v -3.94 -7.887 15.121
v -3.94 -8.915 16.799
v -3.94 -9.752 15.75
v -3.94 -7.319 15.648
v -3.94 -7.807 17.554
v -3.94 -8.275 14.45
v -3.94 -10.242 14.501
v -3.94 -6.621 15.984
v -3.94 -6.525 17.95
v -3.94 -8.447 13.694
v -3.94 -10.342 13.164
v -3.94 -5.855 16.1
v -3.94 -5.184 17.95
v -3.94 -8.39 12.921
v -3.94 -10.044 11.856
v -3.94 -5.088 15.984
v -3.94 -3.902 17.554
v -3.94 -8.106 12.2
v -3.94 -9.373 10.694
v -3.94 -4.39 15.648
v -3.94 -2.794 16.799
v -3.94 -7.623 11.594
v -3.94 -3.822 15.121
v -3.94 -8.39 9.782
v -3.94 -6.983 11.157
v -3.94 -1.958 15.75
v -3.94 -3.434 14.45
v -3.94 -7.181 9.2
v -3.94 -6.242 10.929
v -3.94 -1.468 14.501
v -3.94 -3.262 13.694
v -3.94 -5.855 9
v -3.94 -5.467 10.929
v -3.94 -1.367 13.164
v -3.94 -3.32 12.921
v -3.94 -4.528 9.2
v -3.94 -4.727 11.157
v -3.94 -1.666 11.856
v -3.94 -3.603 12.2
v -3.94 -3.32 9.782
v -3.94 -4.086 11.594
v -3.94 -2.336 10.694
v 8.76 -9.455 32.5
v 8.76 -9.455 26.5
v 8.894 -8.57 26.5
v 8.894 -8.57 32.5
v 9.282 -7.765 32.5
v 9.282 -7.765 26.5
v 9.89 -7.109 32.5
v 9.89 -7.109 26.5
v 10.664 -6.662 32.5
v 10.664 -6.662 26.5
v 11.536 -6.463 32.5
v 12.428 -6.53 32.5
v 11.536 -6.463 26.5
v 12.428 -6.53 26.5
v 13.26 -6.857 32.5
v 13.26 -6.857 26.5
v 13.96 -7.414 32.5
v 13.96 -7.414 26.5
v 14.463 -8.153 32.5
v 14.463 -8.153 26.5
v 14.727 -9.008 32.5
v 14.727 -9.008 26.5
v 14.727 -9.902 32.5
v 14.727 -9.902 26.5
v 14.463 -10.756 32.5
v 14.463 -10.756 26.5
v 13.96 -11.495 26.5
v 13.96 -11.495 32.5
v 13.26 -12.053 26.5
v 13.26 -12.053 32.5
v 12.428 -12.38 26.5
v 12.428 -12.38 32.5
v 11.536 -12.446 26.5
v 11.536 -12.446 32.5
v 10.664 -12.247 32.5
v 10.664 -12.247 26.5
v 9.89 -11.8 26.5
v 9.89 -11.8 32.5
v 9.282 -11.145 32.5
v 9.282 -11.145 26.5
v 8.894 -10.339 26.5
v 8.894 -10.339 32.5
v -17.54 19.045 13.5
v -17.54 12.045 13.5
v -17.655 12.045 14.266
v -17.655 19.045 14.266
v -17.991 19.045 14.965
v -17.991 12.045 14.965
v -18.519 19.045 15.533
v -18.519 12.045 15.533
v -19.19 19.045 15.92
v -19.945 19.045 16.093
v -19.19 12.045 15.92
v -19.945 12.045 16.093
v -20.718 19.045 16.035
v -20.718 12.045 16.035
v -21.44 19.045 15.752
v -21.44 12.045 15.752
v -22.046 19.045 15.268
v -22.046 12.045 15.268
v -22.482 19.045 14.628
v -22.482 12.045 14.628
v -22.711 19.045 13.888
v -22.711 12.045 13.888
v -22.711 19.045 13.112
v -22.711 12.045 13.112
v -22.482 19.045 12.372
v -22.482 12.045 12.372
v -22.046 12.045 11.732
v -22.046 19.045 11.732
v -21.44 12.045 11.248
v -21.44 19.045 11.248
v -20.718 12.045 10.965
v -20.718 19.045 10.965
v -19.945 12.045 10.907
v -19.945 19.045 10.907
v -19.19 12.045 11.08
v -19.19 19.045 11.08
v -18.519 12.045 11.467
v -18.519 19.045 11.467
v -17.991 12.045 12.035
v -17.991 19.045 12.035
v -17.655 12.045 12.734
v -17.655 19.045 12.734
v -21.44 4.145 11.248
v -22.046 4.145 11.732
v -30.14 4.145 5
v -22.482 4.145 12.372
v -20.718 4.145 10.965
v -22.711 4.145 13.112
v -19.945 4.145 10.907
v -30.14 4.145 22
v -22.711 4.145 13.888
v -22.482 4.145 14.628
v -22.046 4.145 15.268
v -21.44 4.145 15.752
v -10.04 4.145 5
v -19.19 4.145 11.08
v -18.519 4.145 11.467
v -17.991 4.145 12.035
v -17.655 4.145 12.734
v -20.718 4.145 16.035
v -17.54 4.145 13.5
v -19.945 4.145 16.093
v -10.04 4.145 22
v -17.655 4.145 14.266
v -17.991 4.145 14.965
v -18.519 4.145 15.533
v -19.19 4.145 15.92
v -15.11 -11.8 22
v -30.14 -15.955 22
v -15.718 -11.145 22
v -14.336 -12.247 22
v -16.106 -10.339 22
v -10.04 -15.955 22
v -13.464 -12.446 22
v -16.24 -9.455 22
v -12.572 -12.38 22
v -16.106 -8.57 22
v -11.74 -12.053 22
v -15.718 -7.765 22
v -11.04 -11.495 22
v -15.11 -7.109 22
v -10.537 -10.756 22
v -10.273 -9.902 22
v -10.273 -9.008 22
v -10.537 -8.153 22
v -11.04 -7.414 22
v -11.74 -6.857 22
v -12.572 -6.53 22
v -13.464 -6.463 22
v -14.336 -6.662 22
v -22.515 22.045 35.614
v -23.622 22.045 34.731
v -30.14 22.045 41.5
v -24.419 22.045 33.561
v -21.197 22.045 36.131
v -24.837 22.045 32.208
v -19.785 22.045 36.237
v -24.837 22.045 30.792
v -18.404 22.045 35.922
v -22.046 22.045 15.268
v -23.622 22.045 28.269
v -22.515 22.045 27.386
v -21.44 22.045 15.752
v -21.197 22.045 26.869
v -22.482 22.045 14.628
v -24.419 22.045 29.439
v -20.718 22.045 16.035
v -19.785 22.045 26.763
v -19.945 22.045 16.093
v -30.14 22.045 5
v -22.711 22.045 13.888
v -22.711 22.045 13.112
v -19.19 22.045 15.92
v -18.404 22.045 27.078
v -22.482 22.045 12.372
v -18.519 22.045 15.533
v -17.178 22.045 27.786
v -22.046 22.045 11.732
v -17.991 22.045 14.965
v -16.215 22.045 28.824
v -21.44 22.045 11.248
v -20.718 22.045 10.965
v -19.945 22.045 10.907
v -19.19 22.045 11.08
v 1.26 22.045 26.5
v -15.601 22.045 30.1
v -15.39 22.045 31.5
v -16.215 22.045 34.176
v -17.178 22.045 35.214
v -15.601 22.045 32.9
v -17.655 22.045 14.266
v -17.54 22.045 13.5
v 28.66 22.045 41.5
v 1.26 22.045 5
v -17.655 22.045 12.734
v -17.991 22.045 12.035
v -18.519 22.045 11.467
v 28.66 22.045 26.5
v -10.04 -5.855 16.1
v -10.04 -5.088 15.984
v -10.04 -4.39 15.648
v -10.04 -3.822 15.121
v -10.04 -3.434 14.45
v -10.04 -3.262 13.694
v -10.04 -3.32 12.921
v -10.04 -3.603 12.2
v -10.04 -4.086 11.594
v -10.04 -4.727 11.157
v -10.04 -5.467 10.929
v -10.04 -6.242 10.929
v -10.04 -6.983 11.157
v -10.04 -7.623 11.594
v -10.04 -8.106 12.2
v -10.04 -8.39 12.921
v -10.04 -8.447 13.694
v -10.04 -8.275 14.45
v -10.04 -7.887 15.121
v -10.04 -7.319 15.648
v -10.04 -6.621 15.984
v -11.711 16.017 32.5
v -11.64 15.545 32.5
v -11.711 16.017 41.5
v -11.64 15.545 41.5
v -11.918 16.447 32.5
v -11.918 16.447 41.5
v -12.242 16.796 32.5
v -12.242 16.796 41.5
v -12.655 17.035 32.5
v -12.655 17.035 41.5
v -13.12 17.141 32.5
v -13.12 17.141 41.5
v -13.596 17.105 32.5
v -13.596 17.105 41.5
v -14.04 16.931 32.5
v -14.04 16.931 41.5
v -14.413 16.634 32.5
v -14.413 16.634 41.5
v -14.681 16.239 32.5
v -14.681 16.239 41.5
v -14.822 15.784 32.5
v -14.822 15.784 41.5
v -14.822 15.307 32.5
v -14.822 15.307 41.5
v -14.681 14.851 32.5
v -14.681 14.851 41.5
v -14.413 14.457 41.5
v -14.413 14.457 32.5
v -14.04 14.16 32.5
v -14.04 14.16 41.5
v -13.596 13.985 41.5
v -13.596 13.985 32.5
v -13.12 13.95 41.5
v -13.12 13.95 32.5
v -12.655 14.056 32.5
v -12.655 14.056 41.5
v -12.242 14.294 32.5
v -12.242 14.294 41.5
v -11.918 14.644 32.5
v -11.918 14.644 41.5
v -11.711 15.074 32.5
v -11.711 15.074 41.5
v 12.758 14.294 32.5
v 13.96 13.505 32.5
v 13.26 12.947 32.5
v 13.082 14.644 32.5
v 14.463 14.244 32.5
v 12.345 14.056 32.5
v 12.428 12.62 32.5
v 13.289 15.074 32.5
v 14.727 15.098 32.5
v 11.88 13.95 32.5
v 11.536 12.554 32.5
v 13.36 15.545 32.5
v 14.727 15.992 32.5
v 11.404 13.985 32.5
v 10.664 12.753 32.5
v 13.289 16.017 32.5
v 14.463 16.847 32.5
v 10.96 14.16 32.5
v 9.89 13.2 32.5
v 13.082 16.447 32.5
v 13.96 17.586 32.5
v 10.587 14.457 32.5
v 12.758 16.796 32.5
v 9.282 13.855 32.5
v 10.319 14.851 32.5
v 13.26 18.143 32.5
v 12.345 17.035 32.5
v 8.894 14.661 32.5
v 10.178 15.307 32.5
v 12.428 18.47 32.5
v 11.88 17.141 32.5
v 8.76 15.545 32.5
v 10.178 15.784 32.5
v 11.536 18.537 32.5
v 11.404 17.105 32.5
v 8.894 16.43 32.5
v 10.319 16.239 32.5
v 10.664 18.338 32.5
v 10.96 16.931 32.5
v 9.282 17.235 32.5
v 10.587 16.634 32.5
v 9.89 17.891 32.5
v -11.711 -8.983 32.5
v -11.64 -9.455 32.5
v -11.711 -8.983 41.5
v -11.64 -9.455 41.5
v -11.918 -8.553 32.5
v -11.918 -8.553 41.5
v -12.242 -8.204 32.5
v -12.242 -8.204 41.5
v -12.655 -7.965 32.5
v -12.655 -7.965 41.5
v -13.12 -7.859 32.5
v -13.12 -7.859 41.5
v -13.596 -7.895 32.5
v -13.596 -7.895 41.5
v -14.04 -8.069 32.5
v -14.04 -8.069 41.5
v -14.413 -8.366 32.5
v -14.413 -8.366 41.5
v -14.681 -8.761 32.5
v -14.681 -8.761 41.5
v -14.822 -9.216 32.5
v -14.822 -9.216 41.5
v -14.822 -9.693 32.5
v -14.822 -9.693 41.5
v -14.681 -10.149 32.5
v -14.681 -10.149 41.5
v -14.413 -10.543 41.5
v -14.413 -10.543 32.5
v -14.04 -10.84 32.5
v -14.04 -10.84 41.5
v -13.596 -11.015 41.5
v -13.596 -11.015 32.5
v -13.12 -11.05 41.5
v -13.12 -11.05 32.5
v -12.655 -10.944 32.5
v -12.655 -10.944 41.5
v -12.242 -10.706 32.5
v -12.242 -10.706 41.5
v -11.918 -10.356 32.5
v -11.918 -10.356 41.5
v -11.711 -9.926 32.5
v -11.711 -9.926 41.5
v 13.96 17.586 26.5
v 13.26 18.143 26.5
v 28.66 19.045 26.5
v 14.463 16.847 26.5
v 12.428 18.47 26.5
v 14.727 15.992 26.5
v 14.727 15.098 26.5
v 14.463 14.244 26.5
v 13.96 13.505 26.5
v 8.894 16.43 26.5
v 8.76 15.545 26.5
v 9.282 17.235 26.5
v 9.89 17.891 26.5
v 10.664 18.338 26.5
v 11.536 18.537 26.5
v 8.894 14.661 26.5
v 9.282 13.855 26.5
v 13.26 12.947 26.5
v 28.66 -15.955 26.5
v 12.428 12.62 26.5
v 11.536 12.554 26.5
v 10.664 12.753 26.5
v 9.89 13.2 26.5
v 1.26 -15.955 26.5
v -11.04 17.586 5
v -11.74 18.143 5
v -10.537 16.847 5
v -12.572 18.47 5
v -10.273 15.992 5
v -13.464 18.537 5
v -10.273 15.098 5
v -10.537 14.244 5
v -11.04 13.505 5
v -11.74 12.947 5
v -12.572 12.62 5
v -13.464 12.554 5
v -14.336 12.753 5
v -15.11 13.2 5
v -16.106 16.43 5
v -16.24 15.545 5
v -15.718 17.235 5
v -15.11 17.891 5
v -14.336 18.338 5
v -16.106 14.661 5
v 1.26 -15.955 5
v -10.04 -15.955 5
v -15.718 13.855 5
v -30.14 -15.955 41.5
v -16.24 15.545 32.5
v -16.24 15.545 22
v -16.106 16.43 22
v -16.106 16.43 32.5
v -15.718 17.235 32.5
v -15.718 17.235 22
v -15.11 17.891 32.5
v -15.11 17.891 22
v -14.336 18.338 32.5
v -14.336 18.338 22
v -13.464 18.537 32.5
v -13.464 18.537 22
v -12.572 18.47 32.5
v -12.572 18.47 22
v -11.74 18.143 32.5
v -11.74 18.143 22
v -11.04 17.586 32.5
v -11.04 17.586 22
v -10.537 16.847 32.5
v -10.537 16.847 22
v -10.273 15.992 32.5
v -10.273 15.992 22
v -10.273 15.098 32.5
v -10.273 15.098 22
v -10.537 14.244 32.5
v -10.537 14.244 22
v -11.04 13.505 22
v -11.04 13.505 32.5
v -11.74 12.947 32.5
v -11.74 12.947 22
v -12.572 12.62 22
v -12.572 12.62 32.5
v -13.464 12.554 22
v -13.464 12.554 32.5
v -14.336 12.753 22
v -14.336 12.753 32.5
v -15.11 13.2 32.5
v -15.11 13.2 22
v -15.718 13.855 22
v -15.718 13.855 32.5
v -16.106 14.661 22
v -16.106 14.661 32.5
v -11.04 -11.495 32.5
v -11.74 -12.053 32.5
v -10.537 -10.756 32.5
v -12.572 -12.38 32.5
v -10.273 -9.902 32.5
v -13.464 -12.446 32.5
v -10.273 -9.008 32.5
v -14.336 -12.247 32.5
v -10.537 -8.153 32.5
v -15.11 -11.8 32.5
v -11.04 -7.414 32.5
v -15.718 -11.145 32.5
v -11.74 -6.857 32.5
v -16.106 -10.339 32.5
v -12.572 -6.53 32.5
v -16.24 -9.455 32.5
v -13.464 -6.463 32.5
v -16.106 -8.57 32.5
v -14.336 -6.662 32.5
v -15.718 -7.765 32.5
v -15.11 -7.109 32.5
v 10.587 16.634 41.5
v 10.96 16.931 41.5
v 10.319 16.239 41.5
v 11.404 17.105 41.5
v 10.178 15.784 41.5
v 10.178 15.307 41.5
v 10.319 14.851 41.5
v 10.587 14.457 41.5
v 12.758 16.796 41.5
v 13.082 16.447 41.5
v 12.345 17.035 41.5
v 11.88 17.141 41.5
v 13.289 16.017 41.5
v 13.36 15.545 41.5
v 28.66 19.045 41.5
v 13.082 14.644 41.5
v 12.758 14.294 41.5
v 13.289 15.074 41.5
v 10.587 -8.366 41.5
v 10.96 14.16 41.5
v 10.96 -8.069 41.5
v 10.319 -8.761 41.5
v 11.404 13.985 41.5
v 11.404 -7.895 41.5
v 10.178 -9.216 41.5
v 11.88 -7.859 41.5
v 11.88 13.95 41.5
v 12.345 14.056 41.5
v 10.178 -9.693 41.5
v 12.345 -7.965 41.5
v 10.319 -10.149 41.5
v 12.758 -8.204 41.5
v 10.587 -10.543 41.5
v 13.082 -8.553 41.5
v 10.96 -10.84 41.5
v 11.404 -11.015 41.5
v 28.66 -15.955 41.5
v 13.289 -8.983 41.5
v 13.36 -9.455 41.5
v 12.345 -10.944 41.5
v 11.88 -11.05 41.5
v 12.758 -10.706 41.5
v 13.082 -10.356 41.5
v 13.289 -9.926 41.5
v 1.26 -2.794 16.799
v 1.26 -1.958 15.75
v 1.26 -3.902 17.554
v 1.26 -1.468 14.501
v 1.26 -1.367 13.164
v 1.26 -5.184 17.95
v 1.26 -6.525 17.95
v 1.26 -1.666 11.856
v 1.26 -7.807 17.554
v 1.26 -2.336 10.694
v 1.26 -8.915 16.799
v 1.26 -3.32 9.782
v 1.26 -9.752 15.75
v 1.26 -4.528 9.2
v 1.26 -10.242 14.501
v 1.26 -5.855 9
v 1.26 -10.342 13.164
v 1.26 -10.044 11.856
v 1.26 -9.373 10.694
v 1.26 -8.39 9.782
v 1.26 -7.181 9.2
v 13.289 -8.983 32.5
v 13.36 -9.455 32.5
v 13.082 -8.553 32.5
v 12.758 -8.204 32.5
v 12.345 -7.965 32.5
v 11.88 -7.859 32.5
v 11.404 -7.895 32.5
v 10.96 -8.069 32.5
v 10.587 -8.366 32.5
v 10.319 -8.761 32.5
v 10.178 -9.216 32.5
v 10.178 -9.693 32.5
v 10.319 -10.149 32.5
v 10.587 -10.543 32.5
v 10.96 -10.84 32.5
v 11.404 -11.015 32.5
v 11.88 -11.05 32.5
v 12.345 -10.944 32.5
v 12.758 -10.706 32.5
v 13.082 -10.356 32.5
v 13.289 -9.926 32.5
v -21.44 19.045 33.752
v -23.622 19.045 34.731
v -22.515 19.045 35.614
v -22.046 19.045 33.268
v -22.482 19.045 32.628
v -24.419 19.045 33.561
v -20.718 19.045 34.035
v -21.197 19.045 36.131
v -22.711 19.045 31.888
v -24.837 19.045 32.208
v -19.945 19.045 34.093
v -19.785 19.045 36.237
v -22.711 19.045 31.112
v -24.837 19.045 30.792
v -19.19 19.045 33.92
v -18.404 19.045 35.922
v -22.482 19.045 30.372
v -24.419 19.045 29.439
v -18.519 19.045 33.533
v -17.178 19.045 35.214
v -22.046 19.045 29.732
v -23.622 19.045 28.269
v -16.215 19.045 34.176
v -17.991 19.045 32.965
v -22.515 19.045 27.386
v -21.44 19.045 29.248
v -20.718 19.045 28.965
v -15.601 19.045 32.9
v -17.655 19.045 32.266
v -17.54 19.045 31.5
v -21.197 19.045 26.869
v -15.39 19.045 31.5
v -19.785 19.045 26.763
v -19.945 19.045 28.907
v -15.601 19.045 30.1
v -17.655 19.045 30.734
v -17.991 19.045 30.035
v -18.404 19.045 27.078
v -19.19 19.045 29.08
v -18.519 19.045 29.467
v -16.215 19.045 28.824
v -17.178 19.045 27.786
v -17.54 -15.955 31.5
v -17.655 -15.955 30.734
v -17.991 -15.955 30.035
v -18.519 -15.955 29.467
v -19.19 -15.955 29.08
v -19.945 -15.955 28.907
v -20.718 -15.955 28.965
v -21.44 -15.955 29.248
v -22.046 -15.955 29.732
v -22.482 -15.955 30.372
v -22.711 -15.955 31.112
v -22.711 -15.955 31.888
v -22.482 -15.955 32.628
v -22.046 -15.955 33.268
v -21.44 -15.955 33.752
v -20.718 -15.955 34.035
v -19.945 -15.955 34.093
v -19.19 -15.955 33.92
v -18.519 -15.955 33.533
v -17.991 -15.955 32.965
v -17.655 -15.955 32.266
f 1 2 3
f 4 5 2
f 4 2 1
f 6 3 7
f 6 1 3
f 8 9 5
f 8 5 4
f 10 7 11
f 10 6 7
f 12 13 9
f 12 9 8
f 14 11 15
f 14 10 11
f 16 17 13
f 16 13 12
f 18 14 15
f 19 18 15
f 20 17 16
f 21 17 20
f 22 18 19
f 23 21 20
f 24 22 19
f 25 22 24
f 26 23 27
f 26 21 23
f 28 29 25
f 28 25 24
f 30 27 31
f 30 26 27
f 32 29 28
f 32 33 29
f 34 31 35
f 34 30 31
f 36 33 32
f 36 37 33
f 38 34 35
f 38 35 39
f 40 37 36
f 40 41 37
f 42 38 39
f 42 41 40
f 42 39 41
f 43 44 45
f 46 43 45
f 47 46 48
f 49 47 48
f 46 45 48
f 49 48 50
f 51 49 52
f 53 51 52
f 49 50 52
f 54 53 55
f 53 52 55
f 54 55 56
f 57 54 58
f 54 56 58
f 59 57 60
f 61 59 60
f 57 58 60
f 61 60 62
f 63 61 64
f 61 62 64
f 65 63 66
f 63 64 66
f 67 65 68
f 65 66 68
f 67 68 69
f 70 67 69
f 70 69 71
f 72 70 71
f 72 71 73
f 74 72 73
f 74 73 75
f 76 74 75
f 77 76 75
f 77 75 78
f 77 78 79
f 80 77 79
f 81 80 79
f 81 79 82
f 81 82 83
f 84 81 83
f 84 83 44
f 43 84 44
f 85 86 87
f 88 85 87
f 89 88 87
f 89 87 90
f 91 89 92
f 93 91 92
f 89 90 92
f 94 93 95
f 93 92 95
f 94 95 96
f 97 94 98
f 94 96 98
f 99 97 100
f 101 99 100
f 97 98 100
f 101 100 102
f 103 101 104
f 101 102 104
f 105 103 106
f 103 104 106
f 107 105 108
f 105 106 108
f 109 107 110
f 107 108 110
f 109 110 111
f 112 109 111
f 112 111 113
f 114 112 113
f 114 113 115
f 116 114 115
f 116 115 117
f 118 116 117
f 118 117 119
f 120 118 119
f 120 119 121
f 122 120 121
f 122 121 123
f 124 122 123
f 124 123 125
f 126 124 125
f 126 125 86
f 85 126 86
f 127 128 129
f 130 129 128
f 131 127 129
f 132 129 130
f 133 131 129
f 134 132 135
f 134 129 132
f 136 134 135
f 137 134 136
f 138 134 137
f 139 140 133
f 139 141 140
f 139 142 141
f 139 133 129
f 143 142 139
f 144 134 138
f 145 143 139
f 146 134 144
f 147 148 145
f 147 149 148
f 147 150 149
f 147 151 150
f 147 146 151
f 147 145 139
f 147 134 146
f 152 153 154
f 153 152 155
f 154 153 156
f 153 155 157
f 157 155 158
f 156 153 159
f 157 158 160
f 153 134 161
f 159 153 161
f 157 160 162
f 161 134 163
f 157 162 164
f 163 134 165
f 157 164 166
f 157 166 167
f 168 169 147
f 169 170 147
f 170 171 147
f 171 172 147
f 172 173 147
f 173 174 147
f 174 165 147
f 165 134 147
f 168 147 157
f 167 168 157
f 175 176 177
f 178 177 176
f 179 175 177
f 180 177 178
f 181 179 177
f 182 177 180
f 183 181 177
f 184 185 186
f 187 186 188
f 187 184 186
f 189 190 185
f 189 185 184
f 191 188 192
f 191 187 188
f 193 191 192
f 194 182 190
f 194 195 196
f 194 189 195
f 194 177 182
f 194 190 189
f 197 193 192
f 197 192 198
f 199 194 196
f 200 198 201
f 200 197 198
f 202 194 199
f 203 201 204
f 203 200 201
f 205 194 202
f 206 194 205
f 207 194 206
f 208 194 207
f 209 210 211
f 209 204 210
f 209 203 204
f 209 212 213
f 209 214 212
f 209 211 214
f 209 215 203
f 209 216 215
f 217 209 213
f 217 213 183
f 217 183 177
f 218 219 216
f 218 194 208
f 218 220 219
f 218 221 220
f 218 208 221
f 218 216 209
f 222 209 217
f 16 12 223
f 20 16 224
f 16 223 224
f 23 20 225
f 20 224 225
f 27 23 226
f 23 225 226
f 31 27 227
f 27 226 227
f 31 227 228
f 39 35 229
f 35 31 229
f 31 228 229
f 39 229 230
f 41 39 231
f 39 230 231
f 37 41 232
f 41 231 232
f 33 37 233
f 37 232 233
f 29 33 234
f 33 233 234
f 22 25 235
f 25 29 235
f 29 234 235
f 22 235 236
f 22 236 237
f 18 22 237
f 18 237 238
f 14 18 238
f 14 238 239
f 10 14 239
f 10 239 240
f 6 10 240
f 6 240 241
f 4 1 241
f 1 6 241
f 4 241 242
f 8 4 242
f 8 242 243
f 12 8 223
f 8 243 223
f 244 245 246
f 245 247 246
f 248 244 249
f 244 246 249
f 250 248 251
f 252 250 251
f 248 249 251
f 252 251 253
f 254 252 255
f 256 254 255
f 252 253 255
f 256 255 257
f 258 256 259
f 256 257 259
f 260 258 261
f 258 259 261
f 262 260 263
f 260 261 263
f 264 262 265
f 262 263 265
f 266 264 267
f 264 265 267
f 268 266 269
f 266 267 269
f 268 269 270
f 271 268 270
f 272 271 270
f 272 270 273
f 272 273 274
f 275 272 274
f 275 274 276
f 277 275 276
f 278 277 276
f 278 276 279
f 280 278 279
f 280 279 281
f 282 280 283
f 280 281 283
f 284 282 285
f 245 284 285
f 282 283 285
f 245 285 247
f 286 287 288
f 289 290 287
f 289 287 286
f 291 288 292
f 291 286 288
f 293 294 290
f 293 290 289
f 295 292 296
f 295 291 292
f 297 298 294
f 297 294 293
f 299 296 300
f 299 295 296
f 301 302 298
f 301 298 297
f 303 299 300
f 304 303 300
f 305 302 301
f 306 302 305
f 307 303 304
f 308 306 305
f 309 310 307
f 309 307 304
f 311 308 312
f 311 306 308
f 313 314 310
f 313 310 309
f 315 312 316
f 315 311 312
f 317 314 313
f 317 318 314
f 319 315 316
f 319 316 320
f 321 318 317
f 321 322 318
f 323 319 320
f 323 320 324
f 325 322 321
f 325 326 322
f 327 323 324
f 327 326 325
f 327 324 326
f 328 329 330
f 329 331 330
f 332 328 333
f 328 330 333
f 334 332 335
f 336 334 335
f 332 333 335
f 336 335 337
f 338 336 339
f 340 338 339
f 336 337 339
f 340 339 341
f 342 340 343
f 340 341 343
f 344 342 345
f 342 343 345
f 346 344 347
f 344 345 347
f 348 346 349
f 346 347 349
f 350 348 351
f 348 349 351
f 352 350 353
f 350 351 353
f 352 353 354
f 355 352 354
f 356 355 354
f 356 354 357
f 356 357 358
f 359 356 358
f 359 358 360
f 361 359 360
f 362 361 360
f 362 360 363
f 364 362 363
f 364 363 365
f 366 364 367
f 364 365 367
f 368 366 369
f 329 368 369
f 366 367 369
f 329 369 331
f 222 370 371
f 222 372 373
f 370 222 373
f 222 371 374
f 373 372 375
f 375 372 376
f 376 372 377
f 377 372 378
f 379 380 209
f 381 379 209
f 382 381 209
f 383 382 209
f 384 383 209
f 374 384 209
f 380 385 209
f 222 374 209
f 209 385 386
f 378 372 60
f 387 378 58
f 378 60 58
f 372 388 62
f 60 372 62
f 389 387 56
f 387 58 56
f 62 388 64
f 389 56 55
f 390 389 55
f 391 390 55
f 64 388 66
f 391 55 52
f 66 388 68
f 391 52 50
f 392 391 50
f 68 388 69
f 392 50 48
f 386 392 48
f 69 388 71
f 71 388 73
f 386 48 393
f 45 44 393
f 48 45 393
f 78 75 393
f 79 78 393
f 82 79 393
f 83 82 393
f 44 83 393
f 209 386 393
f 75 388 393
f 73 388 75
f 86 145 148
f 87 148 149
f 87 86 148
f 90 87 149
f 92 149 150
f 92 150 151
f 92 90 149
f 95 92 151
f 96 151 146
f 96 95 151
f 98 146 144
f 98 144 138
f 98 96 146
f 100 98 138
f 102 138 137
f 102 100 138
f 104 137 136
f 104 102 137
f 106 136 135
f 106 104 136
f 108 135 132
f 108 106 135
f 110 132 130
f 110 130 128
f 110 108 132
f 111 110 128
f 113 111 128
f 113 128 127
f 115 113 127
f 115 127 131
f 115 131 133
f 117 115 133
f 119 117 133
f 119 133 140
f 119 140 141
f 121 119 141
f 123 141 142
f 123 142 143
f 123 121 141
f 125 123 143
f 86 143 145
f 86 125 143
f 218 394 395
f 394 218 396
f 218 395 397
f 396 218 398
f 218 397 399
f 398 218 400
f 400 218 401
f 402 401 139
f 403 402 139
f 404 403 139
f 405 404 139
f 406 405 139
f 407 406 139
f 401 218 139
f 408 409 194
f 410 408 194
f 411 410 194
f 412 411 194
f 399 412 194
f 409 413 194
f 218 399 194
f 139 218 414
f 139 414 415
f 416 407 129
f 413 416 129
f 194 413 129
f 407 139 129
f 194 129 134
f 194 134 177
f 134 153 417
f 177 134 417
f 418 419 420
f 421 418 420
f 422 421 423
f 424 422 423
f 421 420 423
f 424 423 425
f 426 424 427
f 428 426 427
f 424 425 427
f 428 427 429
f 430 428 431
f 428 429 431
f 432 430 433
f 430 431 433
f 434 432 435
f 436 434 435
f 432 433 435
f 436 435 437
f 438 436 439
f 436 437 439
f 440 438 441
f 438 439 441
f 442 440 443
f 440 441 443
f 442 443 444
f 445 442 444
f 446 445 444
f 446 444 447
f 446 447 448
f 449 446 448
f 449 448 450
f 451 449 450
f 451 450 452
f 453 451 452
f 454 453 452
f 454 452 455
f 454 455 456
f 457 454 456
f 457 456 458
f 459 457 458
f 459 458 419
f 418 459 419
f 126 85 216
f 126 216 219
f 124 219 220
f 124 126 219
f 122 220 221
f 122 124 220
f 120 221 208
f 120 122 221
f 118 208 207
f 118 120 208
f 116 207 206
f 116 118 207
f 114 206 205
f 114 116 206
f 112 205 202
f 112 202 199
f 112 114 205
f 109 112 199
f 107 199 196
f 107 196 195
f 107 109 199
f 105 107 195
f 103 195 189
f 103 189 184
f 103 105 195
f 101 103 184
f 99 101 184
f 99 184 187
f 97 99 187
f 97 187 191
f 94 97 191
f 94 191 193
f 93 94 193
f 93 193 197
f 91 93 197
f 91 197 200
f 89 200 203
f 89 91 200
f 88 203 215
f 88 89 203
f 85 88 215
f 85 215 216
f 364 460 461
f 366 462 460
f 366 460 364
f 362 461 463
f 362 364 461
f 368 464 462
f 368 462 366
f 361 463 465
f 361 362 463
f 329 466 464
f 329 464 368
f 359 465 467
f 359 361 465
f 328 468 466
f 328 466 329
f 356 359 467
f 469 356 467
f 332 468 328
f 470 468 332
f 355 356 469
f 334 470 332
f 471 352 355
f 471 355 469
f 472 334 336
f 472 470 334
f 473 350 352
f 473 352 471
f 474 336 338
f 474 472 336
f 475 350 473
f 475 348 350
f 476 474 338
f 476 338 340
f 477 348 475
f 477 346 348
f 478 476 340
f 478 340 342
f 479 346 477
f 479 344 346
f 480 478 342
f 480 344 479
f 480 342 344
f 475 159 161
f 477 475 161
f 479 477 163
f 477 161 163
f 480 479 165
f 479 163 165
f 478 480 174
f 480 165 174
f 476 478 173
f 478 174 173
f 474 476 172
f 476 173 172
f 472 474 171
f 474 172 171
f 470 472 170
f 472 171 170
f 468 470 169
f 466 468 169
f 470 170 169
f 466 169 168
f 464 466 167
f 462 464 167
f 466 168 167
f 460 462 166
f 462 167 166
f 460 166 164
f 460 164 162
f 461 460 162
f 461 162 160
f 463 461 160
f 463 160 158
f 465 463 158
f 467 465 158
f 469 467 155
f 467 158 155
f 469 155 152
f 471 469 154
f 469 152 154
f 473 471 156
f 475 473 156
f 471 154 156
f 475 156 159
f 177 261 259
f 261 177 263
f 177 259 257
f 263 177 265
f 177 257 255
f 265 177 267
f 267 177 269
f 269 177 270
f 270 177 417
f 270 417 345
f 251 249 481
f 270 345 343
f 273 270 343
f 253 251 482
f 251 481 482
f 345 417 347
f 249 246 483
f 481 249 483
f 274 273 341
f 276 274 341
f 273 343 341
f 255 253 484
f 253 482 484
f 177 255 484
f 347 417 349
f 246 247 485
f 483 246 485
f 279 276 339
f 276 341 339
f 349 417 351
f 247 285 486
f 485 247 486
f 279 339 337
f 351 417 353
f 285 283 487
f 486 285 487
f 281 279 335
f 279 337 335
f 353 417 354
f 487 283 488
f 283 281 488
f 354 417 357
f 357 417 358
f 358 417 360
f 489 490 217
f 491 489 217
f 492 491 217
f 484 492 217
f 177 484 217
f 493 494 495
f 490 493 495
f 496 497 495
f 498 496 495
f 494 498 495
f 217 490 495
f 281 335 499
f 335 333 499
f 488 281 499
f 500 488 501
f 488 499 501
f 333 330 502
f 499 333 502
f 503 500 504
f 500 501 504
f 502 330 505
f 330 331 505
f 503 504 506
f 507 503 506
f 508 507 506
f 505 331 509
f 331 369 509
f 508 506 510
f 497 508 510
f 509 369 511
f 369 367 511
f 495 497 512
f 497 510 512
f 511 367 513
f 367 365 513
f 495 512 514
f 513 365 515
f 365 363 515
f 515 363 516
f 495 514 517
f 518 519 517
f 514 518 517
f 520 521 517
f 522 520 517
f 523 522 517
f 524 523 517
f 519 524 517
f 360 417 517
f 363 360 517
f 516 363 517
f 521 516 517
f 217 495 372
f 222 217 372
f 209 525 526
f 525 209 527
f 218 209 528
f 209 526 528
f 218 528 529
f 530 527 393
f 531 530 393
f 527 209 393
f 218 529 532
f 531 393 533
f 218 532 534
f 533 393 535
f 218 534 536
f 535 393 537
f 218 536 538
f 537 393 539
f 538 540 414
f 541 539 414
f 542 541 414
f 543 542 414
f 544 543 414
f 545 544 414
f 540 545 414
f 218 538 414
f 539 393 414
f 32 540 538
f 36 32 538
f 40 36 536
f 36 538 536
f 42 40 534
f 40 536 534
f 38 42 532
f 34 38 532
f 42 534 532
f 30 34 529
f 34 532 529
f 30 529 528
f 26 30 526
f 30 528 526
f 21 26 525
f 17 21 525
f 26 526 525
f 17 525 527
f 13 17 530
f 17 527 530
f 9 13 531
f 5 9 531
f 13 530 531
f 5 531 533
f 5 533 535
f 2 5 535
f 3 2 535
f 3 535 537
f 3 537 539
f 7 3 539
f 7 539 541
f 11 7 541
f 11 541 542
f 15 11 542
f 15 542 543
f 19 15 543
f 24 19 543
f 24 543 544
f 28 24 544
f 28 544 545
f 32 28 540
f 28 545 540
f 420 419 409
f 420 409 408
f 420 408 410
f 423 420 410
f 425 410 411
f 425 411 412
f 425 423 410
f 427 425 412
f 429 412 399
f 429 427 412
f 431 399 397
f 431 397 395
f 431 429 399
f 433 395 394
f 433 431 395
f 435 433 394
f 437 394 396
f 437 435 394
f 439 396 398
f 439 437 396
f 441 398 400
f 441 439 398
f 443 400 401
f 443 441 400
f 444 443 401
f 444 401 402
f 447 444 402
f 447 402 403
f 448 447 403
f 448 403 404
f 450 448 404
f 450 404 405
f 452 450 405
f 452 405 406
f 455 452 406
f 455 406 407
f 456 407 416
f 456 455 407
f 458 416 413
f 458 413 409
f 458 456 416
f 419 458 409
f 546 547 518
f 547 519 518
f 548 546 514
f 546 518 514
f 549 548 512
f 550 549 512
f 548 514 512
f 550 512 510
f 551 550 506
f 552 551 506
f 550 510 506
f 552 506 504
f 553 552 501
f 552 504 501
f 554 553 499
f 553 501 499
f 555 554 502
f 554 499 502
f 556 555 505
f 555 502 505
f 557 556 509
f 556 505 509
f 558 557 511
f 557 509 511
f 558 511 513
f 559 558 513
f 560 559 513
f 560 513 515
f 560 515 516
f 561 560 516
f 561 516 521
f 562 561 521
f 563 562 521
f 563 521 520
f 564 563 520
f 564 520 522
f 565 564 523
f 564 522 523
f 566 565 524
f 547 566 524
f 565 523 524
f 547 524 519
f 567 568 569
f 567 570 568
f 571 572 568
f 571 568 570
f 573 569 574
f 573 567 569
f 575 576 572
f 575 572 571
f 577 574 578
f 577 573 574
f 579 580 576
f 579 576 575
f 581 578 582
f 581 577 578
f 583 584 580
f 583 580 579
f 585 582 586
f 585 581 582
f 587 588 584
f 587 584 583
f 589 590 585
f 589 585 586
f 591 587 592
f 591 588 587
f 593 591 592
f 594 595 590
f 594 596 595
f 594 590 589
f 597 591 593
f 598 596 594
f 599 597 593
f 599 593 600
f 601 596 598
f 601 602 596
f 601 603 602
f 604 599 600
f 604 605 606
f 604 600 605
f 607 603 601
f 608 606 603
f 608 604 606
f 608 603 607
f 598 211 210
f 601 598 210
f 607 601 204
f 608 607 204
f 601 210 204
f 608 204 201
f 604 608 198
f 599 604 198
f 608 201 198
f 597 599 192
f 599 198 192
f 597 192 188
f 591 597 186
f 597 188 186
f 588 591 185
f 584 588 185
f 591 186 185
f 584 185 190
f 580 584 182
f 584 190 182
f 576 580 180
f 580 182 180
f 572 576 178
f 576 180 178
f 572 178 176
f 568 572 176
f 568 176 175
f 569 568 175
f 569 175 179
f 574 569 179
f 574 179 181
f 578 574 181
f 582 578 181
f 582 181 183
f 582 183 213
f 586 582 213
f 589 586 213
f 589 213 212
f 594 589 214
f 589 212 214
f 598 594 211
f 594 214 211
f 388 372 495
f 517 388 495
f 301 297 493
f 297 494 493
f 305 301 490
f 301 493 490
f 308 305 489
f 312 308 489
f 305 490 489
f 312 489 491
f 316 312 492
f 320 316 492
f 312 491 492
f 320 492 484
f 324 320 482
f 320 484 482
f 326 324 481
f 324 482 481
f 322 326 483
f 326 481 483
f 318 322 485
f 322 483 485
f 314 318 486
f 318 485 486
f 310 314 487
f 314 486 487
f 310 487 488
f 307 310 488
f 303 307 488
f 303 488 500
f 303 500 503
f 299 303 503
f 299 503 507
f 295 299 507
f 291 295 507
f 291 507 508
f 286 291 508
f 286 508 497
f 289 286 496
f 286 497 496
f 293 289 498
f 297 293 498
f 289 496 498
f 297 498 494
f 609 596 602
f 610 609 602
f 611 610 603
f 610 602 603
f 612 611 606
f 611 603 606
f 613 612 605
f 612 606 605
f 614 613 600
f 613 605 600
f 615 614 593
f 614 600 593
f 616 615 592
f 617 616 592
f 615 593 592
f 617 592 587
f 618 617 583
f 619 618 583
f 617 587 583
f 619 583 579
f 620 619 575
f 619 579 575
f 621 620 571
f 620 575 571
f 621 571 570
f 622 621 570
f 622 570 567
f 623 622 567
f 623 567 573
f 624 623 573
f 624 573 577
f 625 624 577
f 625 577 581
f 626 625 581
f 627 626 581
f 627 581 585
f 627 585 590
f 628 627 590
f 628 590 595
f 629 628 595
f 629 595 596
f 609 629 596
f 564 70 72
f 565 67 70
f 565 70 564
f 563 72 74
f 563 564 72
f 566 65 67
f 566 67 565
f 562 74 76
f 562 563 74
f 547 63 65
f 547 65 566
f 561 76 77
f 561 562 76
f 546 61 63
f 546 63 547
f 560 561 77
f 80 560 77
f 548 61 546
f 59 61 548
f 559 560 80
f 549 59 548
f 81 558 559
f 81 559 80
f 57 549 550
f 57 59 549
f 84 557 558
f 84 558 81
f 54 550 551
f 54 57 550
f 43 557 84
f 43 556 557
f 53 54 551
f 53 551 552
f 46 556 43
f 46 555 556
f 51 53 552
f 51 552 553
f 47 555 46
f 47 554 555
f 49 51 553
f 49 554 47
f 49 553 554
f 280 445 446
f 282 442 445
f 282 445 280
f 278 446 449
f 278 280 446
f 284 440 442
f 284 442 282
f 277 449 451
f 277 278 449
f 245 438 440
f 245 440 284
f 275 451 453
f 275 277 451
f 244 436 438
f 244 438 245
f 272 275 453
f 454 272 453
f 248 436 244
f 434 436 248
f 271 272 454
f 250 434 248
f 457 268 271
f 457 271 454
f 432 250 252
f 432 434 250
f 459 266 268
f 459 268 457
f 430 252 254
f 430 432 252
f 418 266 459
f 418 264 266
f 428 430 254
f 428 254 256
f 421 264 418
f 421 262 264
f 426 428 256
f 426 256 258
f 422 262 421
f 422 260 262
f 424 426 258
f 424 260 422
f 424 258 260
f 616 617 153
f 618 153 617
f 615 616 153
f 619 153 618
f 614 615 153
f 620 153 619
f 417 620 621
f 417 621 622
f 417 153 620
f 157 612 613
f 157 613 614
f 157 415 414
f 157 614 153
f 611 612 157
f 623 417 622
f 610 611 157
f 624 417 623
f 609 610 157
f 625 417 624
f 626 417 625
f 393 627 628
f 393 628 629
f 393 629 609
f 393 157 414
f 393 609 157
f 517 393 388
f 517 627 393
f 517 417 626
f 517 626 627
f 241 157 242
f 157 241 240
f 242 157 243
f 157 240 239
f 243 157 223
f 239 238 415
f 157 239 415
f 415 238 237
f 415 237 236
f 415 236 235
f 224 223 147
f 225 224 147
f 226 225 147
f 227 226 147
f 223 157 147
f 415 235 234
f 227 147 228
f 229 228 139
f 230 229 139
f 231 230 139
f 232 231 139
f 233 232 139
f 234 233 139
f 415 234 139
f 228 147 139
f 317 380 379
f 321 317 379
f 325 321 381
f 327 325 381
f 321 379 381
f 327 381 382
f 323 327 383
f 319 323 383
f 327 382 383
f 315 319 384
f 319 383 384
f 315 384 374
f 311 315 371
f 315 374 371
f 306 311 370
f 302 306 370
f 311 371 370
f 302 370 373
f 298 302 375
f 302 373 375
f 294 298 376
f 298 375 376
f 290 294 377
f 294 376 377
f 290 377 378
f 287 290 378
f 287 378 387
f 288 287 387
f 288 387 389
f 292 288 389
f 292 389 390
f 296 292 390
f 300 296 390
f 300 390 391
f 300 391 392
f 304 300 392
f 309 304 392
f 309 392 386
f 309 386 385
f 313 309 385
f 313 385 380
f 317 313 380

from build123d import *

# Parameters (mm, degrees)
SKETCH_1_W                = 58.8
SKETCH_1_H                = 32
EXTRUDE_1_DEPTH           = 41.5
HOLE_WIZARD_1_D           = 3.2
HOLE_WIZARD_1_CBORE_D     = 6
HOLE_WIZARD_1_CBORE_DEPTH = 32.5
SKETCH_8_R                = 2.6
CUT_EXTRUDE_6_DEPTH       = 33.5
SKETCH_10_W               = 58.8
SKETCH_10_H               = 41.5
EXTRUDE_2_DEPTH           = 3
SKETCH_18_R               = 2.6
CUT_EXTRUDE_14_DEPTH      = 4
SKETCH_19_W               = 20
SKETCH_19_H               = 20
SKETCH_19_R               = 3
CUT_EXTRUDE_15_DEPTH      = 22
SKETCH_20_R               = 3
CUT_EXTRUDE_16_DEPTH      = 5
CUT_EXTRUDE_17_DEPTH      = 6
SKETCH_22_W               = 27.4
SKETCH_22_H               = 21.5
CUT_EXTRUDE_18_DEPTH      = 36
SKETCH_23_R               = 2.6
CUT_EXTRUDE_19_DEPTH      = 16
CUT_EXTRUDE_20_DEPTH      = 6
SKETCH_25_W               = 20
SKETCH_25_H               = 17
SKETCH_25_R               = 2.6
CUT_EXTRUDE_21_DEPTH      = 0.1
SKETCH_27_W               = 17
SKETCH_27_H               = 20.1
CUT_EXTRUDE_22_DEPTH      = 0.1
SKETCH_28_R               = 2.6
CUT_EXTRUDE_23_DEPTH      = 39.7
SKETCH_29_R               = 4.5
SKETCH_29_R_2             = 2.6
CUT_EXTRUDE_24_DEPTH      = 5
SKETCH_30_R               = 2.6
CUT_EXTRUDE_25_DEPTH      = 36.0000001
SKETCH_31_R               = 2.6
EXTRUDE_3_DEPTH           = 35
SKETCH_32_W               = 20.1
SKETCH_32_H               = 17
SKETCH_32_R               = 2.6
CUT_EXTRUDE_26_DEPTH      = 7
SKETCH_33_W               = 20.1
SKETCH_33_H               = 7
SKETCH_33_R               = 3
EXTRUDE_4_DEPTH           = 17
SKETCH_34_R               = 4.5
EXTRUDE_5_DEPTH           = 5
SKETCH_35_R               = 2.6
EXTRUDE_6_DEPTH           = 6.3
SKETCH_39_R               = 2.6
CUT_EXTRUDE_29_DEPTH      = 8
SKETCH_40_W               = 20.1
SKETCH_40_H               = 17
SKETCH_40_R               = 2.6
EXTRUDE_7_DEPTH           = 7.9
SKETCH_41_W               = 20.1
SKETCH_41_H               = 17
CUT_EXTRUDE_30_DEPTH      = 7.9
SKETCH_42_R               = 2.6
CUT_EXTRUDE_31_DEPTH      = 39.7
SKETCH_43_R               = 4.5
SKETCH_43_R_2             = 2.6
CUT_EXTRUDE_32_DEPTH      = 5.2
SKETCH_44_R               = 2.6
EXTRUDE_8_DEPTH           = 3
SKETCH_46_R               = 4.75
SKETCH_46_R_2             = 2.6
CUT_EXTRUDE_33_DEPTH      = 3


with BuildPart() as part:
    # 草图1 → 凸台-拉伸1 (new body)
    with BuildSketch(Plane.XY):
        with Locations((-0.739622642, 3.045283019)):
            Rectangle(SKETCH_1_W, SKETCH_1_H)
    extrude(amount=EXTRUDE_1_DEPTH)

    # 孔1 (through all)
    with Locations(Plane(origin=(11.760377358, 15.545283019, 0), x_dir=(-1, 0, 0), z_dir=(0, 0, -1))):
        with Locations((0, 0), (25, 0), (25, -25), (0, -25)):
            CounterBoreHole(HOLE_WIZARD_1_D / 2, HOLE_WIZARD_1_CBORE_D / 2, HOLE_WIZARD_1_CBORE_DEPTH)

    # 草图8 → 切除-拉伸6 (cut)
    with BuildSketch(Plane(origin=(0, 19.045283019, 0), x_dir=(1, 0, 0), z_dir=(0, 1, 0))):
        with Locations((-0.739622642, -31.5)):
            Circle(SKETCH_8_R)
    extrude(amount=-CUT_EXTRUDE_6_DEPTH, mode=Mode.SUBTRACT)

    # 草图10 → 凸台-拉伸2 (add)
    with BuildSketch(Plane.XZ.offset(12.954716981)):
        with Locations((-0.739622642, 20.75)):
            Rectangle(SKETCH_10_W, SKETCH_10_H)
    extrude(amount=EXTRUDE_2_DEPTH)

    # 草图18 → 切除-拉伸14 (cut, through all)
    with BuildSketch(Plane(origin=(0, -12.954716981, 0), x_dir=(1, 0, 0), z_dir=(0, 1, 0))):
        with Locations((-0.739622642, -31.5)):
            Circle(SKETCH_18_R)
    extrude(amount=-CUT_EXTRUDE_14_DEPTH, mode=Mode.SUBTRACT)

    # 草图19 → 切除-拉伸15 (cut)
    with BuildSketch(Plane(origin=(0, 0, 0), x_dir=(-1, 0, 0), z_dir=(0, 0, -1))):
        with Locations((20.139622642, 9.045283019)):
            Rectangle(SKETCH_19_W, SKETCH_19_H)
        with Locations((13.239622642, 15.545283019)):
            Circle(SKETCH_19_R, mode=Mode.SUBTRACT)
    extrude(amount=-CUT_EXTRUDE_15_DEPTH, mode=Mode.SUBTRACT)

    # 草图20 → 切除-拉伸16 (cut)
    with BuildSketch(Plane(origin=(0, 0, 0), x_dir=(-1, 0, 0), z_dir=(0, 0, -1))):
        Polygon((30.139622642, -15.954716981), (30.139622642, -0.954716981), (10.139622642, -0.954716981), (10.139622642, 19.045283019), (-28.660377358, 19.045283019), (-28.660377358, -15.954716981), align=None)
        with Locations((13.239622642, -9.454716981)):
            Circle(SKETCH_20_R, mode=Mode.SUBTRACT)
        with Locations((-11.760377358, -9.454716981)):
            Circle(SKETCH_20_R, mode=Mode.SUBTRACT)
        with Locations((-11.760377358, 15.545283019)):
            Circle(SKETCH_20_R, mode=Mode.SUBTRACT)
    extrude(amount=-CUT_EXTRUDE_16_DEPTH, mode=Mode.SUBTRACT)

    # 草图21 → 切除-拉伸17 (cut)
    with BuildSketch(Plane.XZ.offset(15.954716981)):
        Polygon((-30.139622642, 19.214629022), (-17.064744213, 5), (-30.139622642, 5), align=None)
    extrude(amount=-CUT_EXTRUDE_17_DEPTH, mode=Mode.SUBTRACT)

    # 草图22 → 切除-拉伸18 (cut, through all)
    with BuildSketch(Plane(origin=(0, 19.045283019, 0), x_dir=(1, 0, 0), z_dir=(0, 1, 0))):
        with Locations((14.960377358, -15.75)):
            Rectangle(SKETCH_22_W, SKETCH_22_H)
    extrude(amount=-CUT_EXTRUDE_18_DEPTH, mode=Mode.SUBTRACT)

    # 草图23 → 切除-拉伸19 (cut, through all)
    with BuildSketch(Plane(origin=(0, -0.954716981, 0), x_dir=(1, 0, 0), z_dir=(0, 1, 0))):
        with Locations((-20.139622642, -13.5)):
            Circle(SKETCH_23_R)
    extrude(amount=-CUT_EXTRUDE_19_DEPTH, mode=Mode.SUBTRACT)

    # 草图24 → 切除-拉伸20 (cut)
    with BuildSketch(Plane(origin=(0, -15.954716981, 0), x_dir=(-1, 0, 0), z_dir=(0, -1, 0))):
        with BuildLine():
            ThreePointArc((20.787086214, -9.046822379), (16.827633547, -16.546428767), (24.631280369, -13.22611889))
            Line((24.631280369, -13.22611889), (20.787086214, -9.046822379))
        make_face()
        with BuildLine():
            ThreePointArc((20.139622642, -16.1), (18.30114501, -11.661522369), (22.739622642, -13.5))
            ThreePointArc((22.739622642, -13.5), (21.978100273, -15.338477631), (20.139622642, -16.1))
        make_face(mode=Mode.SUBTRACT)
    extrude(amount=-CUT_EXTRUDE_20_DEPTH, mode=Mode.SUBTRACT)

    # 草图25 → 切除-拉伸21 (cut)
    with BuildSketch(Plane(origin=(0, -0.954716981, 0), x_dir=(1, 0, 0), z_dir=(0, 1, 0))):
        with Locations((-20.139622642, -13.5)):
            Rectangle(SKETCH_25_W, SKETCH_25_H)
        with Locations((-20.139622642, -13.5)):
            Circle(SKETCH_25_R, mode=Mode.SUBTRACT)
    extrude(amount=-CUT_EXTRUDE_21_DEPTH, mode=Mode.SUBTRACT)

    # 草图27 → 切除-拉伸22 (cut)
    with BuildSketch(Plane.ZY.offset(10.139622642)):
        with Locations((13.5, 8.995283019)):
            Rectangle(SKETCH_27_W, SKETCH_27_H)
    extrude(amount=-CUT_EXTRUDE_22_DEPTH, mode=Mode.SUBTRACT)

    # 草图28 → 切除-拉伸23 (cut, through all)
    with BuildSketch(Plane.ZY.offset(10.039622642)):
        with Locations((13.5, 8.995283019)):
            Circle(SKETCH_28_R)
    extrude(amount=-CUT_EXTRUDE_23_DEPTH, mode=Mode.SUBTRACT)

    # 草图29 → 切除-拉伸24 (cut)
    with BuildSketch(Plane(origin=(1.260377358, 0, 0), x_dir=(0, 0, -1), z_dir=(1, 0, 0))):
        with Locations((-13.5, 8.995283019)):
            Circle(SKETCH_29_R)
        with Locations((-13.5, 8.995283019)):
            Circle(SKETCH_29_R_2, mode=Mode.SUBTRACT)
    extrude(amount=-CUT_EXTRUDE_24_DEPTH, mode=Mode.SUBTRACT)

    # 草图30 → 切除-拉伸25 (cut, through all)
    with BuildSketch(Plane(origin=(0, 19.045283019, 0), x_dir=(1, 0, 0), z_dir=(0, 1, 0))):
        with Locations((-20.139622642, -31.5)):
            Circle(SKETCH_30_R)
    extrude(amount=-CUT_EXTRUDE_25_DEPTH, mode=Mode.SUBTRACT)

    # 草图31 → 凸台-拉伸3 (add, through all)
    with BuildSketch(Plane(origin=(0, 19.045283019, 0), x_dir=(1, 0, 0), z_dir=(0, 1, 0))):
        with Locations((-0.739622642, -31.5)):
            Circle(SKETCH_31_R)
    extrude(amount=-EXTRUDE_3_DEPTH)

    # 草图32 → 切除-拉伸26 (cut)
    with BuildSketch(Plane(origin=(0, -1.054716981, 0), x_dir=(1, 0, 0), z_dir=(0, 1, 0))):
        with Locations((-20.089622642, -13.5)):
            Rectangle(SKETCH_32_W, SKETCH_32_H)
        with Locations((-20.139622642, -13.5)):
            Circle(SKETCH_32_R, mode=Mode.SUBTRACT)
    extrude(amount=-CUT_EXTRUDE_26_DEPTH, mode=Mode.SUBTRACT)

    # 草图33 → 凸台-拉伸4 (add)
    with BuildSketch(Plane(origin=(0, 0, 22), x_dir=(-1, 0, 0), z_dir=(0, 0, -1))):
        with Locations((20.089622642, 15.545283019)):
            Rectangle(SKETCH_33_W, SKETCH_33_H)
        with Locations((13.239622642, 15.545283019)):
            Circle(SKETCH_33_R, mode=Mode.SUBTRACT)
    extrude(amount=EXTRUDE_4_DEPTH)

    # 草图34 → 凸台-拉伸5 (add)
    with BuildSketch(Plane(origin=(-3.739622642, 0, 0), x_dir=(0, 0, -1), z_dir=(1, 0, 0))):
        with Locations((-13.5, 8.995283019)):
            Circle(SKETCH_34_R)
    extrude(amount=EXTRUDE_5_DEPTH)

    # 草图35 → 凸台-拉伸6 (add)
    with BuildSketch(Plane.ZY.offset(3.739622642)):
        with Locations((13.5, 8.995283019)):
            Circle(SKETCH_35_R)
    extrude(amount=EXTRUDE_6_DEPTH)

    # 草图39 → 切除-拉伸29 (cut, through all)
    with BuildSketch(Plane.XZ.offset(-12.045283019)):
        with Locations((-20.139622642, 13.5)):
            Circle(SKETCH_39_R)
    extrude(amount=-CUT_EXTRUDE_29_DEPTH, mode=Mode.SUBTRACT)

    # 草图40 → 凸台-拉伸7 (add)
    with BuildSketch(Plane.XZ.offset(-12.045283019)):
        with Locations((-20.089622642, 13.5)):
            Rectangle(SKETCH_40_W, SKETCH_40_H)
        with Locations((-20.139622642, 13.5)):
            Circle(SKETCH_40_R, mode=Mode.SUBTRACT)
    extrude(amount=EXTRUDE_7_DEPTH)

    # 草图41 → 切除-拉伸30 (cut)
    with BuildSketch(Plane(origin=(0, -8.054716981, 0), x_dir=(1, 0, 0), z_dir=(0, 1, 0))):
        with Locations((-20.089622642, -13.5)):
            Rectangle(SKETCH_41_W, SKETCH_41_H)
    extrude(amount=-CUT_EXTRUDE_30_DEPTH, mode=Mode.SUBTRACT)

    # 草图42 → 切除-拉伸31 (cut, through all)
    with BuildSketch(Plane.ZY.offset(10.039622642)):
        with Locations((13.5, -5.854716981)):
            Circle(SKETCH_42_R)
    extrude(amount=-CUT_EXTRUDE_31_DEPTH, mode=Mode.SUBTRACT)

    # 草图43 → 切除-拉伸32 (cut)
    with BuildSketch(Plane(origin=(1.260377358, 0, 0), x_dir=(0, 0, -1), z_dir=(1, 0, 0))):
        with Locations((-13.5, -5.854716981)):
            Circle(SKETCH_43_R)
        with Locations((-13.5, -5.854716981)):
            Circle(SKETCH_43_R_2, mode=Mode.SUBTRACT)
    extrude(amount=-CUT_EXTRUDE_32_DEPTH, mode=Mode.SUBTRACT)

    # 草图44 → 凸台-拉伸8 (add)
    with BuildSketch(Plane(origin=(0, 19.045283019, 0), x_dir=(1, 0, 0), z_dir=(0, 1, 0))):
        Polygon((1.260377358, -5), (-30.139622642, -5), (-30.139622642, -41.5), (28.660377358, -41.5), (28.660377358, -26.5), (1.260377358, -26.5), align=None)
        with Locations((-20.139622642, -13.5)):
            Circle(SKETCH_44_R, mode=Mode.SUBTRACT)
        with Locations((-20.139622642, -31.5)):
            Circle(SKETCH_44_R, mode=Mode.SUBTRACT)
    extrude(amount=EXTRUDE_8_DEPTH)

    # 草图46 → 切除-拉伸33 (cut)
    with BuildSketch(Plane(origin=(0, 22.045283019, 0), x_dir=(1, 0, 0), z_dir=(0, 1, 0))):
        with Locations((-20.139622642, -31.5)):
            Circle(SKETCH_46_R)
        with Locations((-20.139622642, -31.5)):
            Circle(SKETCH_46_R_2, mode=Mode.SUBTRACT)
    extrude(amount=-CUT_EXTRUDE_33_DEPTH, mode=Mode.SUBTRACT)


solid = part.part
